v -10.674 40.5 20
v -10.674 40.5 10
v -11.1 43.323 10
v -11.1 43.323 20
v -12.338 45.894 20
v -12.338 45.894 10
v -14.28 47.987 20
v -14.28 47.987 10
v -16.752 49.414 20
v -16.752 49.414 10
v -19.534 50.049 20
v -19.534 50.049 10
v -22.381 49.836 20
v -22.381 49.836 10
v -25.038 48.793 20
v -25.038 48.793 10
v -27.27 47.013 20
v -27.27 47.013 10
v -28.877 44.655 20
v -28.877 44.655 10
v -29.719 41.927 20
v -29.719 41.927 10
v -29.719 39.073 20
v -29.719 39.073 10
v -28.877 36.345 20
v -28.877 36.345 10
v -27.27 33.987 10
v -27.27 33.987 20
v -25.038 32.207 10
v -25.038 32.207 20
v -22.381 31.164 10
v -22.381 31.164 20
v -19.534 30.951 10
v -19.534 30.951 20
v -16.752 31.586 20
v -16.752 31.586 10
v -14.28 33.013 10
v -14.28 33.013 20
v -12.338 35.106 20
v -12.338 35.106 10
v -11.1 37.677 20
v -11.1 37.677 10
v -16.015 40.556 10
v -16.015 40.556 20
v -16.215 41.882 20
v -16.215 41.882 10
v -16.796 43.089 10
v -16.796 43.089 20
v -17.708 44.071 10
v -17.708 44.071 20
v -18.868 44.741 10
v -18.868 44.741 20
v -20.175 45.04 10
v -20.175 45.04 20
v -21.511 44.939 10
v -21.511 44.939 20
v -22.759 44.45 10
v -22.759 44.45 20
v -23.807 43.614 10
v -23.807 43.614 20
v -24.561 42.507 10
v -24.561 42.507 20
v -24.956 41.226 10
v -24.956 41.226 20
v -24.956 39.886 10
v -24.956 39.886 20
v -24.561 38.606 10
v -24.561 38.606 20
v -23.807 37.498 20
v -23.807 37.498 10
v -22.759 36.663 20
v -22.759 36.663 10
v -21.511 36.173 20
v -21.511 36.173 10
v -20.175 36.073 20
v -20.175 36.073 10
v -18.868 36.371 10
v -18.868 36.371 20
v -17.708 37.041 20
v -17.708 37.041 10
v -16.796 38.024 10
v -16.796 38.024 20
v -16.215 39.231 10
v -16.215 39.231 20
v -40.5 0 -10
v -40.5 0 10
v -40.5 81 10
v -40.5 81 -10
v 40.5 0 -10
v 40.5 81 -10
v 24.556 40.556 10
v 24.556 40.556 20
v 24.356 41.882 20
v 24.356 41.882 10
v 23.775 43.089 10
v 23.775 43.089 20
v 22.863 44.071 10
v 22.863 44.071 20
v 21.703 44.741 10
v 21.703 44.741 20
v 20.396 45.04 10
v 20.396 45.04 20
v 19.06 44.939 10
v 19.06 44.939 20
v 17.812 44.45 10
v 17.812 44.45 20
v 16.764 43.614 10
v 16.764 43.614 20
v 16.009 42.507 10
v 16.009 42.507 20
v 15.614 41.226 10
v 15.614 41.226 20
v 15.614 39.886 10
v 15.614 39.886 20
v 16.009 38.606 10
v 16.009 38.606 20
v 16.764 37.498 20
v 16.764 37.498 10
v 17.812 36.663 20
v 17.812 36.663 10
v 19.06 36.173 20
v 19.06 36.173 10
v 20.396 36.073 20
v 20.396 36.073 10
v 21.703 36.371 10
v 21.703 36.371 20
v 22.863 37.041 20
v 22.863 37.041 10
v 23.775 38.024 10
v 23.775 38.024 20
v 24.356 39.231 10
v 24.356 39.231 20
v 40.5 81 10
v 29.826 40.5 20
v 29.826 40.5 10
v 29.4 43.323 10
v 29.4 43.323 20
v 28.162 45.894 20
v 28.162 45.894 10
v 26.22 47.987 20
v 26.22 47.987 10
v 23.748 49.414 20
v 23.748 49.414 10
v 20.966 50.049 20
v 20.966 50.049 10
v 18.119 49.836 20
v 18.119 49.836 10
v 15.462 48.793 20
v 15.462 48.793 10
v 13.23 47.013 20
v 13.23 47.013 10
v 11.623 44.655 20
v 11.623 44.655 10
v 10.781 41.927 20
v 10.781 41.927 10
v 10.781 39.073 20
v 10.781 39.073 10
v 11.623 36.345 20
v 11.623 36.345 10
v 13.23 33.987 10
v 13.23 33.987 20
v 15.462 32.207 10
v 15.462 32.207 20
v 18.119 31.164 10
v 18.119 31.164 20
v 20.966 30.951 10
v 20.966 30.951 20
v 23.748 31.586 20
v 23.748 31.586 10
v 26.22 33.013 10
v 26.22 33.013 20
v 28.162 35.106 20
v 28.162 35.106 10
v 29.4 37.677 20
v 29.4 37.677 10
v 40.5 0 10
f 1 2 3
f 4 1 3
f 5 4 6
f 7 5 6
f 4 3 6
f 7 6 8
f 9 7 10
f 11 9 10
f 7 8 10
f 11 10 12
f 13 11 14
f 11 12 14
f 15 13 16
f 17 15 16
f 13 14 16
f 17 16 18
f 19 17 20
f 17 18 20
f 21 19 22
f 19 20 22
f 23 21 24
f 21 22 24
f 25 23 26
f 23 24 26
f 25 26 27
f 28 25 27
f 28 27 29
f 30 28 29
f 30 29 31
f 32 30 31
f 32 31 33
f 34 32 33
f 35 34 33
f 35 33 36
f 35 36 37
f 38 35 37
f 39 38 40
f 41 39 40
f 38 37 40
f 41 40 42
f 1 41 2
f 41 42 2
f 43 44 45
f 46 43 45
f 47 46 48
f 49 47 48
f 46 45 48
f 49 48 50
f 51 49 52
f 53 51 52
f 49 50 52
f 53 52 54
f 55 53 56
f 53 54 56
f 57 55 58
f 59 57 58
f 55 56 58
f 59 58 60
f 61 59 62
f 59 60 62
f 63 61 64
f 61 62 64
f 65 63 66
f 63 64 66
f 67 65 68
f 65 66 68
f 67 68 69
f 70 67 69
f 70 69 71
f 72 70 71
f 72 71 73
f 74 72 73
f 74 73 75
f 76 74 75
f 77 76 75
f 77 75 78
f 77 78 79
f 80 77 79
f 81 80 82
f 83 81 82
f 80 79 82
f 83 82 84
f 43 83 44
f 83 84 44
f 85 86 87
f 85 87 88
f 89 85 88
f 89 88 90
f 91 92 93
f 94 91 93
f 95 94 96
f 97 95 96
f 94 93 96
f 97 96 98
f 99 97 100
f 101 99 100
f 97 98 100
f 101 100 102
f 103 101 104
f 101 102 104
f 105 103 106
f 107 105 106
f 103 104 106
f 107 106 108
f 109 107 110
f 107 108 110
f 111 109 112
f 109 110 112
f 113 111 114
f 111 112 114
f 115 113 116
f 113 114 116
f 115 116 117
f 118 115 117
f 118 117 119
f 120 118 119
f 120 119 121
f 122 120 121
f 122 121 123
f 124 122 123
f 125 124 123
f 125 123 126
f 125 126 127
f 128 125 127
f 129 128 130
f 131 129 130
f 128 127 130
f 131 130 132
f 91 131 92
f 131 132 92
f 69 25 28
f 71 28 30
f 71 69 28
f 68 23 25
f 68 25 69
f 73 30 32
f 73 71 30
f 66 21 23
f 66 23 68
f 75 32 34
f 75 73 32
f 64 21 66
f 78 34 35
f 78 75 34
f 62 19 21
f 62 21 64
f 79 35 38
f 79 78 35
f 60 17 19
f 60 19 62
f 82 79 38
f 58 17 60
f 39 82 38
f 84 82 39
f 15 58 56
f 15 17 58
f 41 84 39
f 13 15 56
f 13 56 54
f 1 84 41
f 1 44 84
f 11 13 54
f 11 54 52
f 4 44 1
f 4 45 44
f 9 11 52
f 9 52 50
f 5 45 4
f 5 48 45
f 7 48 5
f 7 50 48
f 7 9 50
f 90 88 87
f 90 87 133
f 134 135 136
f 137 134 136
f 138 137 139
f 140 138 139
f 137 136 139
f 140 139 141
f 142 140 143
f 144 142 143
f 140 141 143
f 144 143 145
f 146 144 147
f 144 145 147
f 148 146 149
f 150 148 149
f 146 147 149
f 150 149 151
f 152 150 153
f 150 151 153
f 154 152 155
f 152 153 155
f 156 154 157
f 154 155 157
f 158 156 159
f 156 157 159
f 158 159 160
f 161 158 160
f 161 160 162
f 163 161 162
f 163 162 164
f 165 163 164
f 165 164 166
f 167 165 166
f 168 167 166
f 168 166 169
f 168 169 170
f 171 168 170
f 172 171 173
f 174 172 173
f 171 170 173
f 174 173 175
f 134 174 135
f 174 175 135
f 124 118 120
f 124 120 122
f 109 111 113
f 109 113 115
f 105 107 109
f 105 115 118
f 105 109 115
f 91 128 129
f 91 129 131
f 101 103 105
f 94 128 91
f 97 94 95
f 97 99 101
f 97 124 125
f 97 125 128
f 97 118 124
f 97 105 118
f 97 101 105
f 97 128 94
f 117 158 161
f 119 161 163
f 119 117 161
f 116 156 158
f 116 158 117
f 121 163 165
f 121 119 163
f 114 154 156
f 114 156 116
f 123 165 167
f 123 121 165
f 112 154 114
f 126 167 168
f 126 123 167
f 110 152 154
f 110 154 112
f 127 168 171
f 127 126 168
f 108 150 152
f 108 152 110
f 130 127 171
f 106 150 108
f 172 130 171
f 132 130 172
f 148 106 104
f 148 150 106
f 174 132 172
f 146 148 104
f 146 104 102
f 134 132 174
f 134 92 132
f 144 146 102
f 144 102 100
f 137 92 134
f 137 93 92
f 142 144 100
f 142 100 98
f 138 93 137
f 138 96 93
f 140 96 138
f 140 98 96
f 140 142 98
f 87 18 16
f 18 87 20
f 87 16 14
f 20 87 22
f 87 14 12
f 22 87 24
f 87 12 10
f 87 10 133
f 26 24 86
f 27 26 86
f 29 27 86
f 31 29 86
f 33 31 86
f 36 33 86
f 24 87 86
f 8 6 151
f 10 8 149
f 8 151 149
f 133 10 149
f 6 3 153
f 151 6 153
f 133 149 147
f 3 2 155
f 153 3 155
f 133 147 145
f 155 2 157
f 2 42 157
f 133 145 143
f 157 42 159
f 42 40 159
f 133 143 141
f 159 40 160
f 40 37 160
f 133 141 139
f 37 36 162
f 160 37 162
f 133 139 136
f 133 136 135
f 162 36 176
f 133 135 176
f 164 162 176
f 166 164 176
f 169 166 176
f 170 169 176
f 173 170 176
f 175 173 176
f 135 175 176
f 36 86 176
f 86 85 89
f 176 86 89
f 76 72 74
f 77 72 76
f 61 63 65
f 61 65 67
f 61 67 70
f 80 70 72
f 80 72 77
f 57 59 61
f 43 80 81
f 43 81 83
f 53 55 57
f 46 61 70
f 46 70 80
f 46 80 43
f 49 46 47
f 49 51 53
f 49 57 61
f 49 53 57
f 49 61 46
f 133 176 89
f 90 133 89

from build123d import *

# Parameters (mm, degrees)
SKETCH1_W           = 81
SKETCH1_H           = 20
BOSS_EXTRUDE2_DEPTH = 81
SKETCH2_R           = 9.5758
BOSS_EXTRUDE4_DEPTH = 10
SKETCH4_R           = 4.4958
CUT_EXTRUDE1_DEPTH  = 10


with BuildPart() as part:
    # Sketch1 → Boss-Extrude2 (new body)
    with BuildSketch(Plane(origin=(0, 0, 0), x_dir=(1, 0, 0), z_dir=(0, 1, 0))):
        Rectangle(SKETCH1_W, SKETCH1_H)
    extrude(amount=BOSS_EXTRUDE2_DEPTH)

    # Sketch2 → Boss-Extrude4 (add)
    with BuildSketch(Plane.XY.offset(10)):
        with Locations((-20.25, 40.5)):
            Circle(SKETCH2_R)
        with Locations((20.25, 40.5)):
            Circle(SKETCH2_R)
    extrude(amount=BOSS_EXTRUDE4_DEPTH)

    # Sketch4 → Cut-Extrude1 (cut)
    with BuildSketch(Plane.XY.offset(20)):
        with Locations((-20.510853934, 40.5563485)):
            Circle(SKETCH4_R)
        with Locations((20.060065936, 40.5563485)):
            Circle(SKETCH4_R)
    extrude(amount=-CUT_EXTRUDE1_DEPTH, mode=Mode.SUBTRACT)


solid = part.part
